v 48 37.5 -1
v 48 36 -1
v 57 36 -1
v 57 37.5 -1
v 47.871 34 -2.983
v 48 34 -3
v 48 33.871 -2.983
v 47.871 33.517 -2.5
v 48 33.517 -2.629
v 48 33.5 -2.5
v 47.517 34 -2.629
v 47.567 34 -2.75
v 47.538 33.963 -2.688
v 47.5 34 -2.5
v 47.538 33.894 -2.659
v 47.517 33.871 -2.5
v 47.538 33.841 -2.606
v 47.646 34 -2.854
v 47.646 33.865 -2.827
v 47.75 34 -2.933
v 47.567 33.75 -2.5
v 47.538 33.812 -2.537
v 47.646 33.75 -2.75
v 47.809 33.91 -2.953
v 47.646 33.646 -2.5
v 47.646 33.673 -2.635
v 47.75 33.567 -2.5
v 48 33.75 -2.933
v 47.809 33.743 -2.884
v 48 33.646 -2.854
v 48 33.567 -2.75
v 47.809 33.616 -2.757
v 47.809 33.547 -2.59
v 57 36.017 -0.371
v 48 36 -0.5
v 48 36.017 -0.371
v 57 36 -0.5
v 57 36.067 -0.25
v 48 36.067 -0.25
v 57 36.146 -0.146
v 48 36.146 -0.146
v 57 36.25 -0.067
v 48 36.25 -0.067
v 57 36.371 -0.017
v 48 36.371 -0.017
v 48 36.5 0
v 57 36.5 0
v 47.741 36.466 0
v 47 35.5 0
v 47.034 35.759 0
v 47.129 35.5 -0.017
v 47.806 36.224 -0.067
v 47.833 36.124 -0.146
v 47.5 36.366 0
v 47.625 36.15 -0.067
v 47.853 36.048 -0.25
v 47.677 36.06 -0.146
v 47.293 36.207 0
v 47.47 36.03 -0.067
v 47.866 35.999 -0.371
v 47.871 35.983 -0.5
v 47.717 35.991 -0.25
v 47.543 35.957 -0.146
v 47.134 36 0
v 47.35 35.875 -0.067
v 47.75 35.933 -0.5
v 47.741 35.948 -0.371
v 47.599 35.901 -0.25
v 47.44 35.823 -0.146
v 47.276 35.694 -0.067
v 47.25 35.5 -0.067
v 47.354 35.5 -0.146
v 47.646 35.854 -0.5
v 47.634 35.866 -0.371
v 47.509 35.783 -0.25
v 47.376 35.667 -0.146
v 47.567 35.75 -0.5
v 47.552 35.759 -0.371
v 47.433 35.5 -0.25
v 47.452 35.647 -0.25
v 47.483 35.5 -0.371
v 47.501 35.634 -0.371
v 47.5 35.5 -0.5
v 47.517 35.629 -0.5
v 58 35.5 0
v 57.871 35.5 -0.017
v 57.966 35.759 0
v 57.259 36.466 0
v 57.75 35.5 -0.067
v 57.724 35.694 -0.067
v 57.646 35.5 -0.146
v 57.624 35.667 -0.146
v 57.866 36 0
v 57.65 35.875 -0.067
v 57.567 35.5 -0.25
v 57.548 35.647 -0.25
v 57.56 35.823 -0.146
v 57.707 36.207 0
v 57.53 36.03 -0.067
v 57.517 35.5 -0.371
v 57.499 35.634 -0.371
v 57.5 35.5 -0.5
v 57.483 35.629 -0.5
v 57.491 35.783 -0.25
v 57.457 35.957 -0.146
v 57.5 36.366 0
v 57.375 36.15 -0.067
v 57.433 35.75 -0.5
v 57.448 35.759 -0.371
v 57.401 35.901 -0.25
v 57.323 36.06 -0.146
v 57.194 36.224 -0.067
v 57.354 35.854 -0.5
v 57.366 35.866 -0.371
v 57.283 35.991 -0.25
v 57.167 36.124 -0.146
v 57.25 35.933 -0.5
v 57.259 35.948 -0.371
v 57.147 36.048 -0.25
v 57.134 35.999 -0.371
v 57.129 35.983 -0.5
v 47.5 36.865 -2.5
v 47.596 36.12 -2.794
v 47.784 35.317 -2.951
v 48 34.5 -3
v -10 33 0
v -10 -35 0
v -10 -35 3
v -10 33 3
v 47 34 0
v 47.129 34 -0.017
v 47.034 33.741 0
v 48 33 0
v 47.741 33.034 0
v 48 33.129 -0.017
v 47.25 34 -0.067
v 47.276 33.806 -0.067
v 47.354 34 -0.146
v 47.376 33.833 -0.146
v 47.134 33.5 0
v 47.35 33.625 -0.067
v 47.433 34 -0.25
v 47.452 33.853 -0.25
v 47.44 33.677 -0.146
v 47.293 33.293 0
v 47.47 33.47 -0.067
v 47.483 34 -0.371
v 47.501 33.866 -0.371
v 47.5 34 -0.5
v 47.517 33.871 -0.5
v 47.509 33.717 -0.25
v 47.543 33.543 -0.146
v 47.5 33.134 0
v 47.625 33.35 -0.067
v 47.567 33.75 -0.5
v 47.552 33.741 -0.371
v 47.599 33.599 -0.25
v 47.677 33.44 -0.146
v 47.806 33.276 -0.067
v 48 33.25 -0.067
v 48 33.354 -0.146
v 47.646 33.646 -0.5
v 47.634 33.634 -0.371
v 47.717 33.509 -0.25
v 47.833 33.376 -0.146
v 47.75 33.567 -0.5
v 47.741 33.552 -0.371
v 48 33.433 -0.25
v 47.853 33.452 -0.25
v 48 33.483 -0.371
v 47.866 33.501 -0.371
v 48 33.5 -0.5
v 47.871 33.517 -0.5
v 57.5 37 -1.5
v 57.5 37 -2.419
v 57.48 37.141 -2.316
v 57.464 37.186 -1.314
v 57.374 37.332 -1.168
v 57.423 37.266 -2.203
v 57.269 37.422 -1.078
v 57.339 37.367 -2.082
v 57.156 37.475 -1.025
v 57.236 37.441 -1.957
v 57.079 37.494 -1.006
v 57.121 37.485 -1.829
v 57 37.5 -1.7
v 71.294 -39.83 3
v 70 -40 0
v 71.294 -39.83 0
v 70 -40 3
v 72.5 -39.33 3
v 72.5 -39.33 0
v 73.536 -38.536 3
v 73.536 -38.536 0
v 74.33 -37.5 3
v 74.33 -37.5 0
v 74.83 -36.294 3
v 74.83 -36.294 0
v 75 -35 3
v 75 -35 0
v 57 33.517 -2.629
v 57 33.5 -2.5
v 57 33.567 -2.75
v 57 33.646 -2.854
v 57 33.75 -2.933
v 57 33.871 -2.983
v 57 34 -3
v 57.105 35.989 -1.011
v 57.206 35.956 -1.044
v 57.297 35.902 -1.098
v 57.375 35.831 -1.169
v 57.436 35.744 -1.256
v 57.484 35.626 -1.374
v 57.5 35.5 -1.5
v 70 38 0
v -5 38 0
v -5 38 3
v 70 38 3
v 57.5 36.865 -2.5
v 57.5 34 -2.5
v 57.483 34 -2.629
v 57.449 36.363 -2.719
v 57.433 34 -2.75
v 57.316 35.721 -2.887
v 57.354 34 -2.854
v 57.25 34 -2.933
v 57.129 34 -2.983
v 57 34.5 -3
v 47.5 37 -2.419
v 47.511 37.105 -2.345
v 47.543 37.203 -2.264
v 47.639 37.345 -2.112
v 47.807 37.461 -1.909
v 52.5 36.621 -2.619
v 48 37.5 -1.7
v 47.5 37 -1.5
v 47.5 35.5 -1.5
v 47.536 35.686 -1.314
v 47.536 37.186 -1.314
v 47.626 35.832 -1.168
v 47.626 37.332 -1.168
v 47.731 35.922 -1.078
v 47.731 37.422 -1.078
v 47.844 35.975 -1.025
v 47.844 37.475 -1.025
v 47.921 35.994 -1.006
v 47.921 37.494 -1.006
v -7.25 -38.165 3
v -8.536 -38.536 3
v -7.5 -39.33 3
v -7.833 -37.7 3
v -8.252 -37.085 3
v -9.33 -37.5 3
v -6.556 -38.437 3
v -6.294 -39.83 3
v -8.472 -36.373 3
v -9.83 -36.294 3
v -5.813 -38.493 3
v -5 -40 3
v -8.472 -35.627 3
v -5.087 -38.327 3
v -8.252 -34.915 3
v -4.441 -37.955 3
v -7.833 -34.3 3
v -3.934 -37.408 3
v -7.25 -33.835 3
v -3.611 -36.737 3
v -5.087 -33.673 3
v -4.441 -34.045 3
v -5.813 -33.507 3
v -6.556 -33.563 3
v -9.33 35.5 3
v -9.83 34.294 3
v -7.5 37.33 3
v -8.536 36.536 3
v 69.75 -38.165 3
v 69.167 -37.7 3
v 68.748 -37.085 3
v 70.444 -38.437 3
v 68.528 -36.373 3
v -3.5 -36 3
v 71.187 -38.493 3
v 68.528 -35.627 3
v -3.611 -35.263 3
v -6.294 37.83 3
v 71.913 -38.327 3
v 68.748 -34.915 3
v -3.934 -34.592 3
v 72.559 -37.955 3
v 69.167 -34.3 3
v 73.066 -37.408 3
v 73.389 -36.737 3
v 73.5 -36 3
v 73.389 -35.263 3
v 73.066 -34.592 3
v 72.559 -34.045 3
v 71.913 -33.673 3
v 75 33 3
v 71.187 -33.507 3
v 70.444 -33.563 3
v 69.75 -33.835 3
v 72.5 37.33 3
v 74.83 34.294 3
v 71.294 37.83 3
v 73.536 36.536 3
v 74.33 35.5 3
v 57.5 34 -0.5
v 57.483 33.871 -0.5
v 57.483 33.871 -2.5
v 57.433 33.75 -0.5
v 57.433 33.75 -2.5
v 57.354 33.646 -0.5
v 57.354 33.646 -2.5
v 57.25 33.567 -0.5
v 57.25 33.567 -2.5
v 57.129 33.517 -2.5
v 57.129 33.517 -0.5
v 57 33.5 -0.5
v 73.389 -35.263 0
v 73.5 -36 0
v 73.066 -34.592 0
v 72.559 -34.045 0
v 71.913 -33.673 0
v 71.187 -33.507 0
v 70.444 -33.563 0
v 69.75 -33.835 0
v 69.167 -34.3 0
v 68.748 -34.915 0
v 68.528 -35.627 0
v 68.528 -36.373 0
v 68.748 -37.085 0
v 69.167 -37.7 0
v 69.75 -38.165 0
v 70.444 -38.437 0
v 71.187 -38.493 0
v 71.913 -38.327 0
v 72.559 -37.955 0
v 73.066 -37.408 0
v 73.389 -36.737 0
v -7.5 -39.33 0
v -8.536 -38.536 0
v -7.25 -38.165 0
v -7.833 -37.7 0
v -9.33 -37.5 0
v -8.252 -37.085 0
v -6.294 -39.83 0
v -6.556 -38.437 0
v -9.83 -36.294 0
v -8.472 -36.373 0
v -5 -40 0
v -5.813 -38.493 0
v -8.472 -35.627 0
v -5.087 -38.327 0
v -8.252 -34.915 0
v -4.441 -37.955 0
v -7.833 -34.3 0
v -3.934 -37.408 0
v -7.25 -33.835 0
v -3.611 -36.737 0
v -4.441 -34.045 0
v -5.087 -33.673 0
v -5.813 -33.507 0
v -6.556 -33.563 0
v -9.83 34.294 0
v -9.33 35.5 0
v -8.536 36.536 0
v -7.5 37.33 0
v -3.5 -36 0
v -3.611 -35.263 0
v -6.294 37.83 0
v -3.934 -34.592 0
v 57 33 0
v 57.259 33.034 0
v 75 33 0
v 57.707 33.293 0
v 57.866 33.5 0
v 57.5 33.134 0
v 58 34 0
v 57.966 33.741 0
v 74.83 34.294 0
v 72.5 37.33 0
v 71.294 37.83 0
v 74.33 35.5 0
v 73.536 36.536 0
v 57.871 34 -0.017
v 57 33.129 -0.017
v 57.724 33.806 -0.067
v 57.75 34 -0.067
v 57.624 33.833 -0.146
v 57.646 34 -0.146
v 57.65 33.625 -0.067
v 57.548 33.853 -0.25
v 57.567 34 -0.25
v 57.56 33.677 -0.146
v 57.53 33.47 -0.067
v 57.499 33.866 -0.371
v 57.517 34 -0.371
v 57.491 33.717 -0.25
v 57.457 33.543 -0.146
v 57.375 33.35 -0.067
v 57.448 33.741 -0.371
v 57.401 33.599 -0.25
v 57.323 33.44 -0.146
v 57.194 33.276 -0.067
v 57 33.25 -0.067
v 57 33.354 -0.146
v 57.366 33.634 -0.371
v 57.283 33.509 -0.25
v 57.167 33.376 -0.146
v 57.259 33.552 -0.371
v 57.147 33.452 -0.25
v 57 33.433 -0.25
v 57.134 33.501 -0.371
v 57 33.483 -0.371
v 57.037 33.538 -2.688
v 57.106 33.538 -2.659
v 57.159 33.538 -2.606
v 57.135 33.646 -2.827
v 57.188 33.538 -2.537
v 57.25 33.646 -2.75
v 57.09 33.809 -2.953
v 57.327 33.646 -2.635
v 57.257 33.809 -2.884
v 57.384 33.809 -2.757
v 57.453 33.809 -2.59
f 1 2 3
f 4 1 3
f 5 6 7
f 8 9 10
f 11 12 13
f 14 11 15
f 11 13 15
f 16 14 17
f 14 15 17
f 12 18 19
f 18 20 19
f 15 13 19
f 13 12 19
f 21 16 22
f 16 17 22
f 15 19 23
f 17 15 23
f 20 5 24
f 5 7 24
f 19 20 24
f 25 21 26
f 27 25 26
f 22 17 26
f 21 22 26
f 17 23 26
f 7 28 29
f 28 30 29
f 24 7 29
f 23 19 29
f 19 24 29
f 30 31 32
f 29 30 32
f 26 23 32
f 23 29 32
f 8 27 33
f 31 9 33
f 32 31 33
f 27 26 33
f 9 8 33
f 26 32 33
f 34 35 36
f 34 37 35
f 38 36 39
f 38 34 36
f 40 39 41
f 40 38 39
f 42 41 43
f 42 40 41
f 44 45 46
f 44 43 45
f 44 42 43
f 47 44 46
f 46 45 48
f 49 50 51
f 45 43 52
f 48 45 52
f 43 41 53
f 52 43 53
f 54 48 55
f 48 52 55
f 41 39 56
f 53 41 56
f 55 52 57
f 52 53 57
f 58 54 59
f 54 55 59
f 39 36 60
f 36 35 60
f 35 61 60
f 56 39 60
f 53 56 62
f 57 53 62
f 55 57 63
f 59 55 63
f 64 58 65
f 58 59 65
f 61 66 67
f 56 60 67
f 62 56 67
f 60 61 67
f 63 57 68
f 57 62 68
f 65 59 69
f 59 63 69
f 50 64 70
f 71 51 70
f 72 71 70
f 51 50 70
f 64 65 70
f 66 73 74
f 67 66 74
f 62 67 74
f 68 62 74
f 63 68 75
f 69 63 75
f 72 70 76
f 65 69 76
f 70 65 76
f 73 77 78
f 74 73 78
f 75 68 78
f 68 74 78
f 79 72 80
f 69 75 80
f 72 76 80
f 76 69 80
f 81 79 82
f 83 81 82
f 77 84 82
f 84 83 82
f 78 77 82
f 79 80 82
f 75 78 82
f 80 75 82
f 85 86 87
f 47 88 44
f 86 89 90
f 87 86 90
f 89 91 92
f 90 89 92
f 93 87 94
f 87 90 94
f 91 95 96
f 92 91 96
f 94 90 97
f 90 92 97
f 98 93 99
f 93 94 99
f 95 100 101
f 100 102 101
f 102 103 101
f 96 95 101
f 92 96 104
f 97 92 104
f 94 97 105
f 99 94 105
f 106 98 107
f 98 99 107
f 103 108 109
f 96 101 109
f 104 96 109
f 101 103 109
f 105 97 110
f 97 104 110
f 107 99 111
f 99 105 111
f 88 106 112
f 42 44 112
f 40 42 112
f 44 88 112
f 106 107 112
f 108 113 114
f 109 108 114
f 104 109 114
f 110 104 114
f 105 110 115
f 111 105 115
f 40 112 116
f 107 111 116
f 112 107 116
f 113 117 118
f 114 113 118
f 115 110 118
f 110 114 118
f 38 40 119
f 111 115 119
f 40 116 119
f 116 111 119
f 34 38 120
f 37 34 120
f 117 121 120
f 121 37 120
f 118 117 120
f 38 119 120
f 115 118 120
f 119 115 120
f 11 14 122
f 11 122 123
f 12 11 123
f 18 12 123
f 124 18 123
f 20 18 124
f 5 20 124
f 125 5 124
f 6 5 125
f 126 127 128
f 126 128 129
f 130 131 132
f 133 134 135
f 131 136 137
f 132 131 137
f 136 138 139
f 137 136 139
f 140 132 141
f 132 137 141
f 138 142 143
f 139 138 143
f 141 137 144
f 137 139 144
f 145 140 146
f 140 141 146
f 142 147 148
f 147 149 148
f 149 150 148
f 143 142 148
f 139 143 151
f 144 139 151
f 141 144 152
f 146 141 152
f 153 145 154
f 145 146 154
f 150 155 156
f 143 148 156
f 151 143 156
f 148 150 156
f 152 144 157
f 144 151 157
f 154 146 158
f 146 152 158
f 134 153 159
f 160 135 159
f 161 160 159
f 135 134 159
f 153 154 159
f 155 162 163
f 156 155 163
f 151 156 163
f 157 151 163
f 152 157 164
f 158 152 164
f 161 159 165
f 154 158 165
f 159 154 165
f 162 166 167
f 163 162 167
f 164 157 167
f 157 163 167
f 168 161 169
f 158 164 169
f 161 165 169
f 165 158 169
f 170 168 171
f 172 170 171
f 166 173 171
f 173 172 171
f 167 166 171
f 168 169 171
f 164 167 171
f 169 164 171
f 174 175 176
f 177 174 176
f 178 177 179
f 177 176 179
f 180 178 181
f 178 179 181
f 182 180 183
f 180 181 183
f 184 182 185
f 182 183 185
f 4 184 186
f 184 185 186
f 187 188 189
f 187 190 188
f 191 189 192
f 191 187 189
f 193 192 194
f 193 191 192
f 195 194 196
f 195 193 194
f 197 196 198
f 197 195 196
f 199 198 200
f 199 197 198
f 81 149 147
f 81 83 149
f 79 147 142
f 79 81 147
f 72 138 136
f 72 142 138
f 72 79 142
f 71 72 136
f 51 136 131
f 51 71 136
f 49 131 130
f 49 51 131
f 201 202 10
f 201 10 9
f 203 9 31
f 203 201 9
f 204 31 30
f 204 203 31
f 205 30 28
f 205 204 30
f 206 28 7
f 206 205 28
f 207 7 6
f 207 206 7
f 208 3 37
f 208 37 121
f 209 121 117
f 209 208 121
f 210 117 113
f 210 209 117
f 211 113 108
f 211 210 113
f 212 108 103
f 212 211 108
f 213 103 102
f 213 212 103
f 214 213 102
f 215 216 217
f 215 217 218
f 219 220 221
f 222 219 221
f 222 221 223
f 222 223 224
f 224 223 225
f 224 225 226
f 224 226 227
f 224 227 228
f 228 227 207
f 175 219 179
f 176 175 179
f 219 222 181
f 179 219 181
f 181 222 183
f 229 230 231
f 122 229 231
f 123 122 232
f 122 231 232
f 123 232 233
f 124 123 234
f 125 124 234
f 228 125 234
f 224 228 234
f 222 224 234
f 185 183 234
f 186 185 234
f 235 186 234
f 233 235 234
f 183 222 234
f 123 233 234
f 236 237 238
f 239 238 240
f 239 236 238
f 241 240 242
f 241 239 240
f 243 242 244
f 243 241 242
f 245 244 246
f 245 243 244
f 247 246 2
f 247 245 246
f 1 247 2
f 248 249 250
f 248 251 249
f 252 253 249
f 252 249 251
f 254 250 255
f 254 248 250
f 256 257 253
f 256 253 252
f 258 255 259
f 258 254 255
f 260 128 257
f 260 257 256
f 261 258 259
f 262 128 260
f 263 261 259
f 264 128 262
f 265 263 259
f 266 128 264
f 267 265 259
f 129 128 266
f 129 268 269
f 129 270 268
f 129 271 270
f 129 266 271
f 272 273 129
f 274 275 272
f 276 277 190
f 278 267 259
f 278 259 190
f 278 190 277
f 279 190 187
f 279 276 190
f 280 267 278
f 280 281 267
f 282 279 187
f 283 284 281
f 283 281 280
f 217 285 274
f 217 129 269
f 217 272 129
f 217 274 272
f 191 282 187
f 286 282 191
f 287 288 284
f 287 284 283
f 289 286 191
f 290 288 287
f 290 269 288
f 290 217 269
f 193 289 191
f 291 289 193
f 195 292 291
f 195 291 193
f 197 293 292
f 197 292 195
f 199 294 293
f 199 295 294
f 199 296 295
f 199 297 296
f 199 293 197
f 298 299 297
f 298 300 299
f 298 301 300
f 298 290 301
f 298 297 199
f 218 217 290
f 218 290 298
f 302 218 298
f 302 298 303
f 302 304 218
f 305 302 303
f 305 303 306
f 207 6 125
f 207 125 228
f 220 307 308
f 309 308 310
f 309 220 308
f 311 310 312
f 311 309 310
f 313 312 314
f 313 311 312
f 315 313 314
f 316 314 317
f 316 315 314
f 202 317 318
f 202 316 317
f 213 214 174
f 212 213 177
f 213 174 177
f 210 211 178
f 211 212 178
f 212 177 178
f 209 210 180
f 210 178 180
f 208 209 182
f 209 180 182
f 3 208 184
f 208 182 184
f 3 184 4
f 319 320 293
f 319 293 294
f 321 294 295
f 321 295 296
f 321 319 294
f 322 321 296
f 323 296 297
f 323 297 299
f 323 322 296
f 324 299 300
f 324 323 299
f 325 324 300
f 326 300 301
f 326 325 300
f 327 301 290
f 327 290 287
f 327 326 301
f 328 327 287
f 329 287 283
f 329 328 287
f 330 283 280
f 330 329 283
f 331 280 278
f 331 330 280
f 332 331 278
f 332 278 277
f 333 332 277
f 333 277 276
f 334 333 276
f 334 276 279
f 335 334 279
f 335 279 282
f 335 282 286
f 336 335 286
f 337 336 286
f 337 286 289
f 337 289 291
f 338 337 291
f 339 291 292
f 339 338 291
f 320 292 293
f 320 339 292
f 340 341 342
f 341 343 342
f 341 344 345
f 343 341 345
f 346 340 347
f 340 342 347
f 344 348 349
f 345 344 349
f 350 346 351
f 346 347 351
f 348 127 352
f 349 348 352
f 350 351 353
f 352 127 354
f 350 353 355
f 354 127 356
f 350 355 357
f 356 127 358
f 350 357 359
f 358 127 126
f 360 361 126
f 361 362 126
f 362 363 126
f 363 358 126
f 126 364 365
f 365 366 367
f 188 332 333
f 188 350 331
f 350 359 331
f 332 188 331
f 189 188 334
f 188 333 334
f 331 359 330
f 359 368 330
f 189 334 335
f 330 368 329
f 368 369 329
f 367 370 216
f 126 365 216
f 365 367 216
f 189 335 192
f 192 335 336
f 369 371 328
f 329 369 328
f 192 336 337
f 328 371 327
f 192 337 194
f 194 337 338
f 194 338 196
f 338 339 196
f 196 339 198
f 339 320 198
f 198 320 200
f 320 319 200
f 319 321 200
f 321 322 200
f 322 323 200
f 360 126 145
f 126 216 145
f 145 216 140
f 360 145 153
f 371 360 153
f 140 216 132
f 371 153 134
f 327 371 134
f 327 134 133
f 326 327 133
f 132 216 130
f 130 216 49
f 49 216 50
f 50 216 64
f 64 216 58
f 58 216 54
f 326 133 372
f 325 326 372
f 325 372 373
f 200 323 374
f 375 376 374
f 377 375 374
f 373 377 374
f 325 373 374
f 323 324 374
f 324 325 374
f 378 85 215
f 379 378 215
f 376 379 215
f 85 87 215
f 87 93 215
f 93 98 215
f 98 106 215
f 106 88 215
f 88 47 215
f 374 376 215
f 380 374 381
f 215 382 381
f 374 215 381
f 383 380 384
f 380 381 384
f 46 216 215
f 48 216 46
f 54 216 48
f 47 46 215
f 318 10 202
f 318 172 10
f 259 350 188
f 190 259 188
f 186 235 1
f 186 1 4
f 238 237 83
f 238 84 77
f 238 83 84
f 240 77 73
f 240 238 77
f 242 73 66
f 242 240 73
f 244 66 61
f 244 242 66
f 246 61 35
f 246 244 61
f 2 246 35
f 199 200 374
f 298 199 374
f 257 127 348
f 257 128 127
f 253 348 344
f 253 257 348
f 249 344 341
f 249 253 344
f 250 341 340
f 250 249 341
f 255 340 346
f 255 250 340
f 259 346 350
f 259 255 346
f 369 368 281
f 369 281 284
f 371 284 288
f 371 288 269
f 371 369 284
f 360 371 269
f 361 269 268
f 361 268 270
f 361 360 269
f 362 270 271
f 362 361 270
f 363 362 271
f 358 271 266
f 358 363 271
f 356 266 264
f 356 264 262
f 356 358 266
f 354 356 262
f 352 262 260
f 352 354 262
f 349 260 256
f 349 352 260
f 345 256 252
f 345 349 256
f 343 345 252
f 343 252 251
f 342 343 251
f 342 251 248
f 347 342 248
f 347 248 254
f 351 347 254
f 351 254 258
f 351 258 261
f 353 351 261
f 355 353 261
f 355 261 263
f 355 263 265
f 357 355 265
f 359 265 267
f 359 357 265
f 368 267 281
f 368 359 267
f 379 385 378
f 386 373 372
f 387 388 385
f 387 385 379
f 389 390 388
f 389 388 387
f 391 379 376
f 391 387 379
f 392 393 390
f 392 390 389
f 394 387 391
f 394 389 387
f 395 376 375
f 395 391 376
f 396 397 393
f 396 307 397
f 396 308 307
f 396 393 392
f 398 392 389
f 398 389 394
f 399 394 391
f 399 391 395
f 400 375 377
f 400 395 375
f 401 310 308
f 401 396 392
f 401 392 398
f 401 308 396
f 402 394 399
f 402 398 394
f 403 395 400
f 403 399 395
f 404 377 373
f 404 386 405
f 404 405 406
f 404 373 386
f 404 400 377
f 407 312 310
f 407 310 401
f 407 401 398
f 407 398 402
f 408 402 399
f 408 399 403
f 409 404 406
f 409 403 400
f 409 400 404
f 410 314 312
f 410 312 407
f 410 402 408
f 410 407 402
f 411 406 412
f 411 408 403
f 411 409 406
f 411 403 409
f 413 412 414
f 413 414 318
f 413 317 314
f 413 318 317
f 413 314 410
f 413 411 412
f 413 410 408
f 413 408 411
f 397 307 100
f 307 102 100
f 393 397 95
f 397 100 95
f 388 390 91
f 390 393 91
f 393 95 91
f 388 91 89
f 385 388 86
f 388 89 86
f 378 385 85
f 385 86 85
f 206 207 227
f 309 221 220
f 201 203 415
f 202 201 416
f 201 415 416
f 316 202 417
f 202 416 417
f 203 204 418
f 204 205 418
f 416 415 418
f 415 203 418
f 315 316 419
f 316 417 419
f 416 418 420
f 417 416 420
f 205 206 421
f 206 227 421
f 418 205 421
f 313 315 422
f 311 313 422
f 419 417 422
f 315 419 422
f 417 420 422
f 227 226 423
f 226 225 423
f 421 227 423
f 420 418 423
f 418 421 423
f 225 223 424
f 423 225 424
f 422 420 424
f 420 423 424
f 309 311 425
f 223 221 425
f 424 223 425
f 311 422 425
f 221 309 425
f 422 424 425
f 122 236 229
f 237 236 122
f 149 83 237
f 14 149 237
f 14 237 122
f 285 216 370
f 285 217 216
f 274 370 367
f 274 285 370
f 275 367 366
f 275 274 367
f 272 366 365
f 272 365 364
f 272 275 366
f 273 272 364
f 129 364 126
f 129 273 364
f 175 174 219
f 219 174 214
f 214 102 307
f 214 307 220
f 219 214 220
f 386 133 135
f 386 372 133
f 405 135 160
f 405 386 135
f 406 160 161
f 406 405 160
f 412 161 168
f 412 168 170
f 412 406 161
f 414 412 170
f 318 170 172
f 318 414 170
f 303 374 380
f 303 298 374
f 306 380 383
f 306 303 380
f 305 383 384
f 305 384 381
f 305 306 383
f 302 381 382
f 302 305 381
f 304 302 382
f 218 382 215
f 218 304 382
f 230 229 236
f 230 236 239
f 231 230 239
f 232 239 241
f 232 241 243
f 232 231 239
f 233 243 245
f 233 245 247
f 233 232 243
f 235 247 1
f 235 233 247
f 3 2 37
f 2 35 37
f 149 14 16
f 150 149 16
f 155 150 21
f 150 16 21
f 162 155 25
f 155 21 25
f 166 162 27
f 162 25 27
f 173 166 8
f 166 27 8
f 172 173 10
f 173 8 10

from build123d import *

# Parameters (mm, degrees)
SKETCH2_W           = 85
SKETCH2_H           = 78
BOSS_EXTRUDE2_DEPTH = 3
SKETCH5_R           = 2.5
CUT_EXTRUDE1_DEPTH  = 3
FILLET1_R           = 5
FILLET2_R           = 5
FILLET3_R           = 5
FILLET4_R           = 5
SKETCH12_W          = 10
SKETCH12_H          = 2.5
BOSS_EXTRUDE3_DEPTH = 3
SKETCH14_W          = 10
SKETCH14_H          = 2
BOSS_EXTRUDE4_DEPTH = 1.5
FILLET10_R          = 0.5
FILLET11_START      = 47
FILLET11_DEPTH      = 11


with BuildPart() as part:
    # Sketch2 → Boss-Extrude2 (new body)
    with BuildSketch(Plane.XY):
        with Locations((32.5, -1)):
            Rectangle(SKETCH2_W, SKETCH2_H)
    extrude(amount=BOSS_EXTRUDE2_DEPTH)

    # Sketch5 → Cut-Extrude1 (cut)
    with BuildSketch(Plane.XY):
        with Locations((-6, -36)):
            Circle(SKETCH5_R)
        with Locations((71, -36)):
            Circle(SKETCH5_R)
    extrude(amount=CUT_EXTRUDE1_DEPTH, mode=Mode.SUBTRACT)

    # Fillet1
    fillet1_edges = [part.edges().sort_by_distance(p)[0] for p in [
        (75, -40, 1.5),
    ]]
    fillet(fillet1_edges, radius=FILLET1_R)

    # Fillet2
    fillet2_edges = [part.edges().sort_by_distance(p)[0] for p in [
        (75, 38, 1.5),
    ]]
    fillet(fillet2_edges, radius=FILLET2_R)

    # Fillet3
    fillet3_edges = [part.edges().sort_by_distance(p)[0] for p in [
        (-10, 38, 1.5),
    ]]
    fillet(fillet3_edges, radius=FILLET3_R)

    # Fillet4
    fillet4_edges = [part.edges().sort_by_distance(p)[0] for p in [
        (-10, -40, 1.5),
    ]]
    fillet(fillet4_edges, radius=FILLET4_R)

    # Sketch12 → Boss-Extrude3 (add)
    with BuildSketch(Plane.XY):
        with Locations((52.5, 34.75)):
            Rectangle(SKETCH12_W, SKETCH12_H)
    extrude(amount=-BOSS_EXTRUDE3_DEPTH)

    # Sketch14 → Boss-Extrude4 (add)
    with BuildSketch(Plane(origin=(0, 36, 0), x_dir=(1, 0, 0), z_dir=(0, 1, 0))):
        with Locations((52.5, 2)):
            Rectangle(SKETCH14_W, SKETCH14_H)
    extrude(amount=BOSS_EXTRUDE4_DEPTH)

    # Fillet10
    fillet10_edges = [part.edges().sort_by_distance(p)[0] for p in [
        (57.5, 35.5, -3),
        (52.5, 33.5, -3),
        (57.5, 33.5, -1.5),
        (47.5, 35.5, -3),
        (47.5, 33.5, -1.5),
        (57.5, 34.75, 0),
        (52.5, 36, 0),
        (47.5, 34.75, 0),
        (52.5, 33.5, 0),
        (57.5, 36, -0.5),
        (47.5, 36, -0.5),
        (47.5, 36.75, -1),
        (57.5, 36.75, -1),
        (47.5, 37.5, -2),
        (57.5, 37.5, -2),
    ]]
    fillet(fillet10_edges, radius=FILLET10_R)

    # Fillet11: read off the stored shape, not the designer's step
    # Fillet11 outline → Fillet11 (cut)
    with BuildSketch(Plane.YZ.offset(FILLET11_START)):
        with BuildLine():
            add(Edge.make_bspline(
                [(34.5, -3), (37.5, -3), (37.5, -1.7)],
                knots=[0, 0, 0, 1, 1, 1], degree=2, weights=[1, 0.707106781, 1]))
            Line((34.5, -3), (37.5, -3))
            Line((37.5, -3), (37.5, -1.7))
        make_face()
    extrude(amount=FILLET11_DEPTH, mode=Mode.SUBTRACT)


solid = part.part
